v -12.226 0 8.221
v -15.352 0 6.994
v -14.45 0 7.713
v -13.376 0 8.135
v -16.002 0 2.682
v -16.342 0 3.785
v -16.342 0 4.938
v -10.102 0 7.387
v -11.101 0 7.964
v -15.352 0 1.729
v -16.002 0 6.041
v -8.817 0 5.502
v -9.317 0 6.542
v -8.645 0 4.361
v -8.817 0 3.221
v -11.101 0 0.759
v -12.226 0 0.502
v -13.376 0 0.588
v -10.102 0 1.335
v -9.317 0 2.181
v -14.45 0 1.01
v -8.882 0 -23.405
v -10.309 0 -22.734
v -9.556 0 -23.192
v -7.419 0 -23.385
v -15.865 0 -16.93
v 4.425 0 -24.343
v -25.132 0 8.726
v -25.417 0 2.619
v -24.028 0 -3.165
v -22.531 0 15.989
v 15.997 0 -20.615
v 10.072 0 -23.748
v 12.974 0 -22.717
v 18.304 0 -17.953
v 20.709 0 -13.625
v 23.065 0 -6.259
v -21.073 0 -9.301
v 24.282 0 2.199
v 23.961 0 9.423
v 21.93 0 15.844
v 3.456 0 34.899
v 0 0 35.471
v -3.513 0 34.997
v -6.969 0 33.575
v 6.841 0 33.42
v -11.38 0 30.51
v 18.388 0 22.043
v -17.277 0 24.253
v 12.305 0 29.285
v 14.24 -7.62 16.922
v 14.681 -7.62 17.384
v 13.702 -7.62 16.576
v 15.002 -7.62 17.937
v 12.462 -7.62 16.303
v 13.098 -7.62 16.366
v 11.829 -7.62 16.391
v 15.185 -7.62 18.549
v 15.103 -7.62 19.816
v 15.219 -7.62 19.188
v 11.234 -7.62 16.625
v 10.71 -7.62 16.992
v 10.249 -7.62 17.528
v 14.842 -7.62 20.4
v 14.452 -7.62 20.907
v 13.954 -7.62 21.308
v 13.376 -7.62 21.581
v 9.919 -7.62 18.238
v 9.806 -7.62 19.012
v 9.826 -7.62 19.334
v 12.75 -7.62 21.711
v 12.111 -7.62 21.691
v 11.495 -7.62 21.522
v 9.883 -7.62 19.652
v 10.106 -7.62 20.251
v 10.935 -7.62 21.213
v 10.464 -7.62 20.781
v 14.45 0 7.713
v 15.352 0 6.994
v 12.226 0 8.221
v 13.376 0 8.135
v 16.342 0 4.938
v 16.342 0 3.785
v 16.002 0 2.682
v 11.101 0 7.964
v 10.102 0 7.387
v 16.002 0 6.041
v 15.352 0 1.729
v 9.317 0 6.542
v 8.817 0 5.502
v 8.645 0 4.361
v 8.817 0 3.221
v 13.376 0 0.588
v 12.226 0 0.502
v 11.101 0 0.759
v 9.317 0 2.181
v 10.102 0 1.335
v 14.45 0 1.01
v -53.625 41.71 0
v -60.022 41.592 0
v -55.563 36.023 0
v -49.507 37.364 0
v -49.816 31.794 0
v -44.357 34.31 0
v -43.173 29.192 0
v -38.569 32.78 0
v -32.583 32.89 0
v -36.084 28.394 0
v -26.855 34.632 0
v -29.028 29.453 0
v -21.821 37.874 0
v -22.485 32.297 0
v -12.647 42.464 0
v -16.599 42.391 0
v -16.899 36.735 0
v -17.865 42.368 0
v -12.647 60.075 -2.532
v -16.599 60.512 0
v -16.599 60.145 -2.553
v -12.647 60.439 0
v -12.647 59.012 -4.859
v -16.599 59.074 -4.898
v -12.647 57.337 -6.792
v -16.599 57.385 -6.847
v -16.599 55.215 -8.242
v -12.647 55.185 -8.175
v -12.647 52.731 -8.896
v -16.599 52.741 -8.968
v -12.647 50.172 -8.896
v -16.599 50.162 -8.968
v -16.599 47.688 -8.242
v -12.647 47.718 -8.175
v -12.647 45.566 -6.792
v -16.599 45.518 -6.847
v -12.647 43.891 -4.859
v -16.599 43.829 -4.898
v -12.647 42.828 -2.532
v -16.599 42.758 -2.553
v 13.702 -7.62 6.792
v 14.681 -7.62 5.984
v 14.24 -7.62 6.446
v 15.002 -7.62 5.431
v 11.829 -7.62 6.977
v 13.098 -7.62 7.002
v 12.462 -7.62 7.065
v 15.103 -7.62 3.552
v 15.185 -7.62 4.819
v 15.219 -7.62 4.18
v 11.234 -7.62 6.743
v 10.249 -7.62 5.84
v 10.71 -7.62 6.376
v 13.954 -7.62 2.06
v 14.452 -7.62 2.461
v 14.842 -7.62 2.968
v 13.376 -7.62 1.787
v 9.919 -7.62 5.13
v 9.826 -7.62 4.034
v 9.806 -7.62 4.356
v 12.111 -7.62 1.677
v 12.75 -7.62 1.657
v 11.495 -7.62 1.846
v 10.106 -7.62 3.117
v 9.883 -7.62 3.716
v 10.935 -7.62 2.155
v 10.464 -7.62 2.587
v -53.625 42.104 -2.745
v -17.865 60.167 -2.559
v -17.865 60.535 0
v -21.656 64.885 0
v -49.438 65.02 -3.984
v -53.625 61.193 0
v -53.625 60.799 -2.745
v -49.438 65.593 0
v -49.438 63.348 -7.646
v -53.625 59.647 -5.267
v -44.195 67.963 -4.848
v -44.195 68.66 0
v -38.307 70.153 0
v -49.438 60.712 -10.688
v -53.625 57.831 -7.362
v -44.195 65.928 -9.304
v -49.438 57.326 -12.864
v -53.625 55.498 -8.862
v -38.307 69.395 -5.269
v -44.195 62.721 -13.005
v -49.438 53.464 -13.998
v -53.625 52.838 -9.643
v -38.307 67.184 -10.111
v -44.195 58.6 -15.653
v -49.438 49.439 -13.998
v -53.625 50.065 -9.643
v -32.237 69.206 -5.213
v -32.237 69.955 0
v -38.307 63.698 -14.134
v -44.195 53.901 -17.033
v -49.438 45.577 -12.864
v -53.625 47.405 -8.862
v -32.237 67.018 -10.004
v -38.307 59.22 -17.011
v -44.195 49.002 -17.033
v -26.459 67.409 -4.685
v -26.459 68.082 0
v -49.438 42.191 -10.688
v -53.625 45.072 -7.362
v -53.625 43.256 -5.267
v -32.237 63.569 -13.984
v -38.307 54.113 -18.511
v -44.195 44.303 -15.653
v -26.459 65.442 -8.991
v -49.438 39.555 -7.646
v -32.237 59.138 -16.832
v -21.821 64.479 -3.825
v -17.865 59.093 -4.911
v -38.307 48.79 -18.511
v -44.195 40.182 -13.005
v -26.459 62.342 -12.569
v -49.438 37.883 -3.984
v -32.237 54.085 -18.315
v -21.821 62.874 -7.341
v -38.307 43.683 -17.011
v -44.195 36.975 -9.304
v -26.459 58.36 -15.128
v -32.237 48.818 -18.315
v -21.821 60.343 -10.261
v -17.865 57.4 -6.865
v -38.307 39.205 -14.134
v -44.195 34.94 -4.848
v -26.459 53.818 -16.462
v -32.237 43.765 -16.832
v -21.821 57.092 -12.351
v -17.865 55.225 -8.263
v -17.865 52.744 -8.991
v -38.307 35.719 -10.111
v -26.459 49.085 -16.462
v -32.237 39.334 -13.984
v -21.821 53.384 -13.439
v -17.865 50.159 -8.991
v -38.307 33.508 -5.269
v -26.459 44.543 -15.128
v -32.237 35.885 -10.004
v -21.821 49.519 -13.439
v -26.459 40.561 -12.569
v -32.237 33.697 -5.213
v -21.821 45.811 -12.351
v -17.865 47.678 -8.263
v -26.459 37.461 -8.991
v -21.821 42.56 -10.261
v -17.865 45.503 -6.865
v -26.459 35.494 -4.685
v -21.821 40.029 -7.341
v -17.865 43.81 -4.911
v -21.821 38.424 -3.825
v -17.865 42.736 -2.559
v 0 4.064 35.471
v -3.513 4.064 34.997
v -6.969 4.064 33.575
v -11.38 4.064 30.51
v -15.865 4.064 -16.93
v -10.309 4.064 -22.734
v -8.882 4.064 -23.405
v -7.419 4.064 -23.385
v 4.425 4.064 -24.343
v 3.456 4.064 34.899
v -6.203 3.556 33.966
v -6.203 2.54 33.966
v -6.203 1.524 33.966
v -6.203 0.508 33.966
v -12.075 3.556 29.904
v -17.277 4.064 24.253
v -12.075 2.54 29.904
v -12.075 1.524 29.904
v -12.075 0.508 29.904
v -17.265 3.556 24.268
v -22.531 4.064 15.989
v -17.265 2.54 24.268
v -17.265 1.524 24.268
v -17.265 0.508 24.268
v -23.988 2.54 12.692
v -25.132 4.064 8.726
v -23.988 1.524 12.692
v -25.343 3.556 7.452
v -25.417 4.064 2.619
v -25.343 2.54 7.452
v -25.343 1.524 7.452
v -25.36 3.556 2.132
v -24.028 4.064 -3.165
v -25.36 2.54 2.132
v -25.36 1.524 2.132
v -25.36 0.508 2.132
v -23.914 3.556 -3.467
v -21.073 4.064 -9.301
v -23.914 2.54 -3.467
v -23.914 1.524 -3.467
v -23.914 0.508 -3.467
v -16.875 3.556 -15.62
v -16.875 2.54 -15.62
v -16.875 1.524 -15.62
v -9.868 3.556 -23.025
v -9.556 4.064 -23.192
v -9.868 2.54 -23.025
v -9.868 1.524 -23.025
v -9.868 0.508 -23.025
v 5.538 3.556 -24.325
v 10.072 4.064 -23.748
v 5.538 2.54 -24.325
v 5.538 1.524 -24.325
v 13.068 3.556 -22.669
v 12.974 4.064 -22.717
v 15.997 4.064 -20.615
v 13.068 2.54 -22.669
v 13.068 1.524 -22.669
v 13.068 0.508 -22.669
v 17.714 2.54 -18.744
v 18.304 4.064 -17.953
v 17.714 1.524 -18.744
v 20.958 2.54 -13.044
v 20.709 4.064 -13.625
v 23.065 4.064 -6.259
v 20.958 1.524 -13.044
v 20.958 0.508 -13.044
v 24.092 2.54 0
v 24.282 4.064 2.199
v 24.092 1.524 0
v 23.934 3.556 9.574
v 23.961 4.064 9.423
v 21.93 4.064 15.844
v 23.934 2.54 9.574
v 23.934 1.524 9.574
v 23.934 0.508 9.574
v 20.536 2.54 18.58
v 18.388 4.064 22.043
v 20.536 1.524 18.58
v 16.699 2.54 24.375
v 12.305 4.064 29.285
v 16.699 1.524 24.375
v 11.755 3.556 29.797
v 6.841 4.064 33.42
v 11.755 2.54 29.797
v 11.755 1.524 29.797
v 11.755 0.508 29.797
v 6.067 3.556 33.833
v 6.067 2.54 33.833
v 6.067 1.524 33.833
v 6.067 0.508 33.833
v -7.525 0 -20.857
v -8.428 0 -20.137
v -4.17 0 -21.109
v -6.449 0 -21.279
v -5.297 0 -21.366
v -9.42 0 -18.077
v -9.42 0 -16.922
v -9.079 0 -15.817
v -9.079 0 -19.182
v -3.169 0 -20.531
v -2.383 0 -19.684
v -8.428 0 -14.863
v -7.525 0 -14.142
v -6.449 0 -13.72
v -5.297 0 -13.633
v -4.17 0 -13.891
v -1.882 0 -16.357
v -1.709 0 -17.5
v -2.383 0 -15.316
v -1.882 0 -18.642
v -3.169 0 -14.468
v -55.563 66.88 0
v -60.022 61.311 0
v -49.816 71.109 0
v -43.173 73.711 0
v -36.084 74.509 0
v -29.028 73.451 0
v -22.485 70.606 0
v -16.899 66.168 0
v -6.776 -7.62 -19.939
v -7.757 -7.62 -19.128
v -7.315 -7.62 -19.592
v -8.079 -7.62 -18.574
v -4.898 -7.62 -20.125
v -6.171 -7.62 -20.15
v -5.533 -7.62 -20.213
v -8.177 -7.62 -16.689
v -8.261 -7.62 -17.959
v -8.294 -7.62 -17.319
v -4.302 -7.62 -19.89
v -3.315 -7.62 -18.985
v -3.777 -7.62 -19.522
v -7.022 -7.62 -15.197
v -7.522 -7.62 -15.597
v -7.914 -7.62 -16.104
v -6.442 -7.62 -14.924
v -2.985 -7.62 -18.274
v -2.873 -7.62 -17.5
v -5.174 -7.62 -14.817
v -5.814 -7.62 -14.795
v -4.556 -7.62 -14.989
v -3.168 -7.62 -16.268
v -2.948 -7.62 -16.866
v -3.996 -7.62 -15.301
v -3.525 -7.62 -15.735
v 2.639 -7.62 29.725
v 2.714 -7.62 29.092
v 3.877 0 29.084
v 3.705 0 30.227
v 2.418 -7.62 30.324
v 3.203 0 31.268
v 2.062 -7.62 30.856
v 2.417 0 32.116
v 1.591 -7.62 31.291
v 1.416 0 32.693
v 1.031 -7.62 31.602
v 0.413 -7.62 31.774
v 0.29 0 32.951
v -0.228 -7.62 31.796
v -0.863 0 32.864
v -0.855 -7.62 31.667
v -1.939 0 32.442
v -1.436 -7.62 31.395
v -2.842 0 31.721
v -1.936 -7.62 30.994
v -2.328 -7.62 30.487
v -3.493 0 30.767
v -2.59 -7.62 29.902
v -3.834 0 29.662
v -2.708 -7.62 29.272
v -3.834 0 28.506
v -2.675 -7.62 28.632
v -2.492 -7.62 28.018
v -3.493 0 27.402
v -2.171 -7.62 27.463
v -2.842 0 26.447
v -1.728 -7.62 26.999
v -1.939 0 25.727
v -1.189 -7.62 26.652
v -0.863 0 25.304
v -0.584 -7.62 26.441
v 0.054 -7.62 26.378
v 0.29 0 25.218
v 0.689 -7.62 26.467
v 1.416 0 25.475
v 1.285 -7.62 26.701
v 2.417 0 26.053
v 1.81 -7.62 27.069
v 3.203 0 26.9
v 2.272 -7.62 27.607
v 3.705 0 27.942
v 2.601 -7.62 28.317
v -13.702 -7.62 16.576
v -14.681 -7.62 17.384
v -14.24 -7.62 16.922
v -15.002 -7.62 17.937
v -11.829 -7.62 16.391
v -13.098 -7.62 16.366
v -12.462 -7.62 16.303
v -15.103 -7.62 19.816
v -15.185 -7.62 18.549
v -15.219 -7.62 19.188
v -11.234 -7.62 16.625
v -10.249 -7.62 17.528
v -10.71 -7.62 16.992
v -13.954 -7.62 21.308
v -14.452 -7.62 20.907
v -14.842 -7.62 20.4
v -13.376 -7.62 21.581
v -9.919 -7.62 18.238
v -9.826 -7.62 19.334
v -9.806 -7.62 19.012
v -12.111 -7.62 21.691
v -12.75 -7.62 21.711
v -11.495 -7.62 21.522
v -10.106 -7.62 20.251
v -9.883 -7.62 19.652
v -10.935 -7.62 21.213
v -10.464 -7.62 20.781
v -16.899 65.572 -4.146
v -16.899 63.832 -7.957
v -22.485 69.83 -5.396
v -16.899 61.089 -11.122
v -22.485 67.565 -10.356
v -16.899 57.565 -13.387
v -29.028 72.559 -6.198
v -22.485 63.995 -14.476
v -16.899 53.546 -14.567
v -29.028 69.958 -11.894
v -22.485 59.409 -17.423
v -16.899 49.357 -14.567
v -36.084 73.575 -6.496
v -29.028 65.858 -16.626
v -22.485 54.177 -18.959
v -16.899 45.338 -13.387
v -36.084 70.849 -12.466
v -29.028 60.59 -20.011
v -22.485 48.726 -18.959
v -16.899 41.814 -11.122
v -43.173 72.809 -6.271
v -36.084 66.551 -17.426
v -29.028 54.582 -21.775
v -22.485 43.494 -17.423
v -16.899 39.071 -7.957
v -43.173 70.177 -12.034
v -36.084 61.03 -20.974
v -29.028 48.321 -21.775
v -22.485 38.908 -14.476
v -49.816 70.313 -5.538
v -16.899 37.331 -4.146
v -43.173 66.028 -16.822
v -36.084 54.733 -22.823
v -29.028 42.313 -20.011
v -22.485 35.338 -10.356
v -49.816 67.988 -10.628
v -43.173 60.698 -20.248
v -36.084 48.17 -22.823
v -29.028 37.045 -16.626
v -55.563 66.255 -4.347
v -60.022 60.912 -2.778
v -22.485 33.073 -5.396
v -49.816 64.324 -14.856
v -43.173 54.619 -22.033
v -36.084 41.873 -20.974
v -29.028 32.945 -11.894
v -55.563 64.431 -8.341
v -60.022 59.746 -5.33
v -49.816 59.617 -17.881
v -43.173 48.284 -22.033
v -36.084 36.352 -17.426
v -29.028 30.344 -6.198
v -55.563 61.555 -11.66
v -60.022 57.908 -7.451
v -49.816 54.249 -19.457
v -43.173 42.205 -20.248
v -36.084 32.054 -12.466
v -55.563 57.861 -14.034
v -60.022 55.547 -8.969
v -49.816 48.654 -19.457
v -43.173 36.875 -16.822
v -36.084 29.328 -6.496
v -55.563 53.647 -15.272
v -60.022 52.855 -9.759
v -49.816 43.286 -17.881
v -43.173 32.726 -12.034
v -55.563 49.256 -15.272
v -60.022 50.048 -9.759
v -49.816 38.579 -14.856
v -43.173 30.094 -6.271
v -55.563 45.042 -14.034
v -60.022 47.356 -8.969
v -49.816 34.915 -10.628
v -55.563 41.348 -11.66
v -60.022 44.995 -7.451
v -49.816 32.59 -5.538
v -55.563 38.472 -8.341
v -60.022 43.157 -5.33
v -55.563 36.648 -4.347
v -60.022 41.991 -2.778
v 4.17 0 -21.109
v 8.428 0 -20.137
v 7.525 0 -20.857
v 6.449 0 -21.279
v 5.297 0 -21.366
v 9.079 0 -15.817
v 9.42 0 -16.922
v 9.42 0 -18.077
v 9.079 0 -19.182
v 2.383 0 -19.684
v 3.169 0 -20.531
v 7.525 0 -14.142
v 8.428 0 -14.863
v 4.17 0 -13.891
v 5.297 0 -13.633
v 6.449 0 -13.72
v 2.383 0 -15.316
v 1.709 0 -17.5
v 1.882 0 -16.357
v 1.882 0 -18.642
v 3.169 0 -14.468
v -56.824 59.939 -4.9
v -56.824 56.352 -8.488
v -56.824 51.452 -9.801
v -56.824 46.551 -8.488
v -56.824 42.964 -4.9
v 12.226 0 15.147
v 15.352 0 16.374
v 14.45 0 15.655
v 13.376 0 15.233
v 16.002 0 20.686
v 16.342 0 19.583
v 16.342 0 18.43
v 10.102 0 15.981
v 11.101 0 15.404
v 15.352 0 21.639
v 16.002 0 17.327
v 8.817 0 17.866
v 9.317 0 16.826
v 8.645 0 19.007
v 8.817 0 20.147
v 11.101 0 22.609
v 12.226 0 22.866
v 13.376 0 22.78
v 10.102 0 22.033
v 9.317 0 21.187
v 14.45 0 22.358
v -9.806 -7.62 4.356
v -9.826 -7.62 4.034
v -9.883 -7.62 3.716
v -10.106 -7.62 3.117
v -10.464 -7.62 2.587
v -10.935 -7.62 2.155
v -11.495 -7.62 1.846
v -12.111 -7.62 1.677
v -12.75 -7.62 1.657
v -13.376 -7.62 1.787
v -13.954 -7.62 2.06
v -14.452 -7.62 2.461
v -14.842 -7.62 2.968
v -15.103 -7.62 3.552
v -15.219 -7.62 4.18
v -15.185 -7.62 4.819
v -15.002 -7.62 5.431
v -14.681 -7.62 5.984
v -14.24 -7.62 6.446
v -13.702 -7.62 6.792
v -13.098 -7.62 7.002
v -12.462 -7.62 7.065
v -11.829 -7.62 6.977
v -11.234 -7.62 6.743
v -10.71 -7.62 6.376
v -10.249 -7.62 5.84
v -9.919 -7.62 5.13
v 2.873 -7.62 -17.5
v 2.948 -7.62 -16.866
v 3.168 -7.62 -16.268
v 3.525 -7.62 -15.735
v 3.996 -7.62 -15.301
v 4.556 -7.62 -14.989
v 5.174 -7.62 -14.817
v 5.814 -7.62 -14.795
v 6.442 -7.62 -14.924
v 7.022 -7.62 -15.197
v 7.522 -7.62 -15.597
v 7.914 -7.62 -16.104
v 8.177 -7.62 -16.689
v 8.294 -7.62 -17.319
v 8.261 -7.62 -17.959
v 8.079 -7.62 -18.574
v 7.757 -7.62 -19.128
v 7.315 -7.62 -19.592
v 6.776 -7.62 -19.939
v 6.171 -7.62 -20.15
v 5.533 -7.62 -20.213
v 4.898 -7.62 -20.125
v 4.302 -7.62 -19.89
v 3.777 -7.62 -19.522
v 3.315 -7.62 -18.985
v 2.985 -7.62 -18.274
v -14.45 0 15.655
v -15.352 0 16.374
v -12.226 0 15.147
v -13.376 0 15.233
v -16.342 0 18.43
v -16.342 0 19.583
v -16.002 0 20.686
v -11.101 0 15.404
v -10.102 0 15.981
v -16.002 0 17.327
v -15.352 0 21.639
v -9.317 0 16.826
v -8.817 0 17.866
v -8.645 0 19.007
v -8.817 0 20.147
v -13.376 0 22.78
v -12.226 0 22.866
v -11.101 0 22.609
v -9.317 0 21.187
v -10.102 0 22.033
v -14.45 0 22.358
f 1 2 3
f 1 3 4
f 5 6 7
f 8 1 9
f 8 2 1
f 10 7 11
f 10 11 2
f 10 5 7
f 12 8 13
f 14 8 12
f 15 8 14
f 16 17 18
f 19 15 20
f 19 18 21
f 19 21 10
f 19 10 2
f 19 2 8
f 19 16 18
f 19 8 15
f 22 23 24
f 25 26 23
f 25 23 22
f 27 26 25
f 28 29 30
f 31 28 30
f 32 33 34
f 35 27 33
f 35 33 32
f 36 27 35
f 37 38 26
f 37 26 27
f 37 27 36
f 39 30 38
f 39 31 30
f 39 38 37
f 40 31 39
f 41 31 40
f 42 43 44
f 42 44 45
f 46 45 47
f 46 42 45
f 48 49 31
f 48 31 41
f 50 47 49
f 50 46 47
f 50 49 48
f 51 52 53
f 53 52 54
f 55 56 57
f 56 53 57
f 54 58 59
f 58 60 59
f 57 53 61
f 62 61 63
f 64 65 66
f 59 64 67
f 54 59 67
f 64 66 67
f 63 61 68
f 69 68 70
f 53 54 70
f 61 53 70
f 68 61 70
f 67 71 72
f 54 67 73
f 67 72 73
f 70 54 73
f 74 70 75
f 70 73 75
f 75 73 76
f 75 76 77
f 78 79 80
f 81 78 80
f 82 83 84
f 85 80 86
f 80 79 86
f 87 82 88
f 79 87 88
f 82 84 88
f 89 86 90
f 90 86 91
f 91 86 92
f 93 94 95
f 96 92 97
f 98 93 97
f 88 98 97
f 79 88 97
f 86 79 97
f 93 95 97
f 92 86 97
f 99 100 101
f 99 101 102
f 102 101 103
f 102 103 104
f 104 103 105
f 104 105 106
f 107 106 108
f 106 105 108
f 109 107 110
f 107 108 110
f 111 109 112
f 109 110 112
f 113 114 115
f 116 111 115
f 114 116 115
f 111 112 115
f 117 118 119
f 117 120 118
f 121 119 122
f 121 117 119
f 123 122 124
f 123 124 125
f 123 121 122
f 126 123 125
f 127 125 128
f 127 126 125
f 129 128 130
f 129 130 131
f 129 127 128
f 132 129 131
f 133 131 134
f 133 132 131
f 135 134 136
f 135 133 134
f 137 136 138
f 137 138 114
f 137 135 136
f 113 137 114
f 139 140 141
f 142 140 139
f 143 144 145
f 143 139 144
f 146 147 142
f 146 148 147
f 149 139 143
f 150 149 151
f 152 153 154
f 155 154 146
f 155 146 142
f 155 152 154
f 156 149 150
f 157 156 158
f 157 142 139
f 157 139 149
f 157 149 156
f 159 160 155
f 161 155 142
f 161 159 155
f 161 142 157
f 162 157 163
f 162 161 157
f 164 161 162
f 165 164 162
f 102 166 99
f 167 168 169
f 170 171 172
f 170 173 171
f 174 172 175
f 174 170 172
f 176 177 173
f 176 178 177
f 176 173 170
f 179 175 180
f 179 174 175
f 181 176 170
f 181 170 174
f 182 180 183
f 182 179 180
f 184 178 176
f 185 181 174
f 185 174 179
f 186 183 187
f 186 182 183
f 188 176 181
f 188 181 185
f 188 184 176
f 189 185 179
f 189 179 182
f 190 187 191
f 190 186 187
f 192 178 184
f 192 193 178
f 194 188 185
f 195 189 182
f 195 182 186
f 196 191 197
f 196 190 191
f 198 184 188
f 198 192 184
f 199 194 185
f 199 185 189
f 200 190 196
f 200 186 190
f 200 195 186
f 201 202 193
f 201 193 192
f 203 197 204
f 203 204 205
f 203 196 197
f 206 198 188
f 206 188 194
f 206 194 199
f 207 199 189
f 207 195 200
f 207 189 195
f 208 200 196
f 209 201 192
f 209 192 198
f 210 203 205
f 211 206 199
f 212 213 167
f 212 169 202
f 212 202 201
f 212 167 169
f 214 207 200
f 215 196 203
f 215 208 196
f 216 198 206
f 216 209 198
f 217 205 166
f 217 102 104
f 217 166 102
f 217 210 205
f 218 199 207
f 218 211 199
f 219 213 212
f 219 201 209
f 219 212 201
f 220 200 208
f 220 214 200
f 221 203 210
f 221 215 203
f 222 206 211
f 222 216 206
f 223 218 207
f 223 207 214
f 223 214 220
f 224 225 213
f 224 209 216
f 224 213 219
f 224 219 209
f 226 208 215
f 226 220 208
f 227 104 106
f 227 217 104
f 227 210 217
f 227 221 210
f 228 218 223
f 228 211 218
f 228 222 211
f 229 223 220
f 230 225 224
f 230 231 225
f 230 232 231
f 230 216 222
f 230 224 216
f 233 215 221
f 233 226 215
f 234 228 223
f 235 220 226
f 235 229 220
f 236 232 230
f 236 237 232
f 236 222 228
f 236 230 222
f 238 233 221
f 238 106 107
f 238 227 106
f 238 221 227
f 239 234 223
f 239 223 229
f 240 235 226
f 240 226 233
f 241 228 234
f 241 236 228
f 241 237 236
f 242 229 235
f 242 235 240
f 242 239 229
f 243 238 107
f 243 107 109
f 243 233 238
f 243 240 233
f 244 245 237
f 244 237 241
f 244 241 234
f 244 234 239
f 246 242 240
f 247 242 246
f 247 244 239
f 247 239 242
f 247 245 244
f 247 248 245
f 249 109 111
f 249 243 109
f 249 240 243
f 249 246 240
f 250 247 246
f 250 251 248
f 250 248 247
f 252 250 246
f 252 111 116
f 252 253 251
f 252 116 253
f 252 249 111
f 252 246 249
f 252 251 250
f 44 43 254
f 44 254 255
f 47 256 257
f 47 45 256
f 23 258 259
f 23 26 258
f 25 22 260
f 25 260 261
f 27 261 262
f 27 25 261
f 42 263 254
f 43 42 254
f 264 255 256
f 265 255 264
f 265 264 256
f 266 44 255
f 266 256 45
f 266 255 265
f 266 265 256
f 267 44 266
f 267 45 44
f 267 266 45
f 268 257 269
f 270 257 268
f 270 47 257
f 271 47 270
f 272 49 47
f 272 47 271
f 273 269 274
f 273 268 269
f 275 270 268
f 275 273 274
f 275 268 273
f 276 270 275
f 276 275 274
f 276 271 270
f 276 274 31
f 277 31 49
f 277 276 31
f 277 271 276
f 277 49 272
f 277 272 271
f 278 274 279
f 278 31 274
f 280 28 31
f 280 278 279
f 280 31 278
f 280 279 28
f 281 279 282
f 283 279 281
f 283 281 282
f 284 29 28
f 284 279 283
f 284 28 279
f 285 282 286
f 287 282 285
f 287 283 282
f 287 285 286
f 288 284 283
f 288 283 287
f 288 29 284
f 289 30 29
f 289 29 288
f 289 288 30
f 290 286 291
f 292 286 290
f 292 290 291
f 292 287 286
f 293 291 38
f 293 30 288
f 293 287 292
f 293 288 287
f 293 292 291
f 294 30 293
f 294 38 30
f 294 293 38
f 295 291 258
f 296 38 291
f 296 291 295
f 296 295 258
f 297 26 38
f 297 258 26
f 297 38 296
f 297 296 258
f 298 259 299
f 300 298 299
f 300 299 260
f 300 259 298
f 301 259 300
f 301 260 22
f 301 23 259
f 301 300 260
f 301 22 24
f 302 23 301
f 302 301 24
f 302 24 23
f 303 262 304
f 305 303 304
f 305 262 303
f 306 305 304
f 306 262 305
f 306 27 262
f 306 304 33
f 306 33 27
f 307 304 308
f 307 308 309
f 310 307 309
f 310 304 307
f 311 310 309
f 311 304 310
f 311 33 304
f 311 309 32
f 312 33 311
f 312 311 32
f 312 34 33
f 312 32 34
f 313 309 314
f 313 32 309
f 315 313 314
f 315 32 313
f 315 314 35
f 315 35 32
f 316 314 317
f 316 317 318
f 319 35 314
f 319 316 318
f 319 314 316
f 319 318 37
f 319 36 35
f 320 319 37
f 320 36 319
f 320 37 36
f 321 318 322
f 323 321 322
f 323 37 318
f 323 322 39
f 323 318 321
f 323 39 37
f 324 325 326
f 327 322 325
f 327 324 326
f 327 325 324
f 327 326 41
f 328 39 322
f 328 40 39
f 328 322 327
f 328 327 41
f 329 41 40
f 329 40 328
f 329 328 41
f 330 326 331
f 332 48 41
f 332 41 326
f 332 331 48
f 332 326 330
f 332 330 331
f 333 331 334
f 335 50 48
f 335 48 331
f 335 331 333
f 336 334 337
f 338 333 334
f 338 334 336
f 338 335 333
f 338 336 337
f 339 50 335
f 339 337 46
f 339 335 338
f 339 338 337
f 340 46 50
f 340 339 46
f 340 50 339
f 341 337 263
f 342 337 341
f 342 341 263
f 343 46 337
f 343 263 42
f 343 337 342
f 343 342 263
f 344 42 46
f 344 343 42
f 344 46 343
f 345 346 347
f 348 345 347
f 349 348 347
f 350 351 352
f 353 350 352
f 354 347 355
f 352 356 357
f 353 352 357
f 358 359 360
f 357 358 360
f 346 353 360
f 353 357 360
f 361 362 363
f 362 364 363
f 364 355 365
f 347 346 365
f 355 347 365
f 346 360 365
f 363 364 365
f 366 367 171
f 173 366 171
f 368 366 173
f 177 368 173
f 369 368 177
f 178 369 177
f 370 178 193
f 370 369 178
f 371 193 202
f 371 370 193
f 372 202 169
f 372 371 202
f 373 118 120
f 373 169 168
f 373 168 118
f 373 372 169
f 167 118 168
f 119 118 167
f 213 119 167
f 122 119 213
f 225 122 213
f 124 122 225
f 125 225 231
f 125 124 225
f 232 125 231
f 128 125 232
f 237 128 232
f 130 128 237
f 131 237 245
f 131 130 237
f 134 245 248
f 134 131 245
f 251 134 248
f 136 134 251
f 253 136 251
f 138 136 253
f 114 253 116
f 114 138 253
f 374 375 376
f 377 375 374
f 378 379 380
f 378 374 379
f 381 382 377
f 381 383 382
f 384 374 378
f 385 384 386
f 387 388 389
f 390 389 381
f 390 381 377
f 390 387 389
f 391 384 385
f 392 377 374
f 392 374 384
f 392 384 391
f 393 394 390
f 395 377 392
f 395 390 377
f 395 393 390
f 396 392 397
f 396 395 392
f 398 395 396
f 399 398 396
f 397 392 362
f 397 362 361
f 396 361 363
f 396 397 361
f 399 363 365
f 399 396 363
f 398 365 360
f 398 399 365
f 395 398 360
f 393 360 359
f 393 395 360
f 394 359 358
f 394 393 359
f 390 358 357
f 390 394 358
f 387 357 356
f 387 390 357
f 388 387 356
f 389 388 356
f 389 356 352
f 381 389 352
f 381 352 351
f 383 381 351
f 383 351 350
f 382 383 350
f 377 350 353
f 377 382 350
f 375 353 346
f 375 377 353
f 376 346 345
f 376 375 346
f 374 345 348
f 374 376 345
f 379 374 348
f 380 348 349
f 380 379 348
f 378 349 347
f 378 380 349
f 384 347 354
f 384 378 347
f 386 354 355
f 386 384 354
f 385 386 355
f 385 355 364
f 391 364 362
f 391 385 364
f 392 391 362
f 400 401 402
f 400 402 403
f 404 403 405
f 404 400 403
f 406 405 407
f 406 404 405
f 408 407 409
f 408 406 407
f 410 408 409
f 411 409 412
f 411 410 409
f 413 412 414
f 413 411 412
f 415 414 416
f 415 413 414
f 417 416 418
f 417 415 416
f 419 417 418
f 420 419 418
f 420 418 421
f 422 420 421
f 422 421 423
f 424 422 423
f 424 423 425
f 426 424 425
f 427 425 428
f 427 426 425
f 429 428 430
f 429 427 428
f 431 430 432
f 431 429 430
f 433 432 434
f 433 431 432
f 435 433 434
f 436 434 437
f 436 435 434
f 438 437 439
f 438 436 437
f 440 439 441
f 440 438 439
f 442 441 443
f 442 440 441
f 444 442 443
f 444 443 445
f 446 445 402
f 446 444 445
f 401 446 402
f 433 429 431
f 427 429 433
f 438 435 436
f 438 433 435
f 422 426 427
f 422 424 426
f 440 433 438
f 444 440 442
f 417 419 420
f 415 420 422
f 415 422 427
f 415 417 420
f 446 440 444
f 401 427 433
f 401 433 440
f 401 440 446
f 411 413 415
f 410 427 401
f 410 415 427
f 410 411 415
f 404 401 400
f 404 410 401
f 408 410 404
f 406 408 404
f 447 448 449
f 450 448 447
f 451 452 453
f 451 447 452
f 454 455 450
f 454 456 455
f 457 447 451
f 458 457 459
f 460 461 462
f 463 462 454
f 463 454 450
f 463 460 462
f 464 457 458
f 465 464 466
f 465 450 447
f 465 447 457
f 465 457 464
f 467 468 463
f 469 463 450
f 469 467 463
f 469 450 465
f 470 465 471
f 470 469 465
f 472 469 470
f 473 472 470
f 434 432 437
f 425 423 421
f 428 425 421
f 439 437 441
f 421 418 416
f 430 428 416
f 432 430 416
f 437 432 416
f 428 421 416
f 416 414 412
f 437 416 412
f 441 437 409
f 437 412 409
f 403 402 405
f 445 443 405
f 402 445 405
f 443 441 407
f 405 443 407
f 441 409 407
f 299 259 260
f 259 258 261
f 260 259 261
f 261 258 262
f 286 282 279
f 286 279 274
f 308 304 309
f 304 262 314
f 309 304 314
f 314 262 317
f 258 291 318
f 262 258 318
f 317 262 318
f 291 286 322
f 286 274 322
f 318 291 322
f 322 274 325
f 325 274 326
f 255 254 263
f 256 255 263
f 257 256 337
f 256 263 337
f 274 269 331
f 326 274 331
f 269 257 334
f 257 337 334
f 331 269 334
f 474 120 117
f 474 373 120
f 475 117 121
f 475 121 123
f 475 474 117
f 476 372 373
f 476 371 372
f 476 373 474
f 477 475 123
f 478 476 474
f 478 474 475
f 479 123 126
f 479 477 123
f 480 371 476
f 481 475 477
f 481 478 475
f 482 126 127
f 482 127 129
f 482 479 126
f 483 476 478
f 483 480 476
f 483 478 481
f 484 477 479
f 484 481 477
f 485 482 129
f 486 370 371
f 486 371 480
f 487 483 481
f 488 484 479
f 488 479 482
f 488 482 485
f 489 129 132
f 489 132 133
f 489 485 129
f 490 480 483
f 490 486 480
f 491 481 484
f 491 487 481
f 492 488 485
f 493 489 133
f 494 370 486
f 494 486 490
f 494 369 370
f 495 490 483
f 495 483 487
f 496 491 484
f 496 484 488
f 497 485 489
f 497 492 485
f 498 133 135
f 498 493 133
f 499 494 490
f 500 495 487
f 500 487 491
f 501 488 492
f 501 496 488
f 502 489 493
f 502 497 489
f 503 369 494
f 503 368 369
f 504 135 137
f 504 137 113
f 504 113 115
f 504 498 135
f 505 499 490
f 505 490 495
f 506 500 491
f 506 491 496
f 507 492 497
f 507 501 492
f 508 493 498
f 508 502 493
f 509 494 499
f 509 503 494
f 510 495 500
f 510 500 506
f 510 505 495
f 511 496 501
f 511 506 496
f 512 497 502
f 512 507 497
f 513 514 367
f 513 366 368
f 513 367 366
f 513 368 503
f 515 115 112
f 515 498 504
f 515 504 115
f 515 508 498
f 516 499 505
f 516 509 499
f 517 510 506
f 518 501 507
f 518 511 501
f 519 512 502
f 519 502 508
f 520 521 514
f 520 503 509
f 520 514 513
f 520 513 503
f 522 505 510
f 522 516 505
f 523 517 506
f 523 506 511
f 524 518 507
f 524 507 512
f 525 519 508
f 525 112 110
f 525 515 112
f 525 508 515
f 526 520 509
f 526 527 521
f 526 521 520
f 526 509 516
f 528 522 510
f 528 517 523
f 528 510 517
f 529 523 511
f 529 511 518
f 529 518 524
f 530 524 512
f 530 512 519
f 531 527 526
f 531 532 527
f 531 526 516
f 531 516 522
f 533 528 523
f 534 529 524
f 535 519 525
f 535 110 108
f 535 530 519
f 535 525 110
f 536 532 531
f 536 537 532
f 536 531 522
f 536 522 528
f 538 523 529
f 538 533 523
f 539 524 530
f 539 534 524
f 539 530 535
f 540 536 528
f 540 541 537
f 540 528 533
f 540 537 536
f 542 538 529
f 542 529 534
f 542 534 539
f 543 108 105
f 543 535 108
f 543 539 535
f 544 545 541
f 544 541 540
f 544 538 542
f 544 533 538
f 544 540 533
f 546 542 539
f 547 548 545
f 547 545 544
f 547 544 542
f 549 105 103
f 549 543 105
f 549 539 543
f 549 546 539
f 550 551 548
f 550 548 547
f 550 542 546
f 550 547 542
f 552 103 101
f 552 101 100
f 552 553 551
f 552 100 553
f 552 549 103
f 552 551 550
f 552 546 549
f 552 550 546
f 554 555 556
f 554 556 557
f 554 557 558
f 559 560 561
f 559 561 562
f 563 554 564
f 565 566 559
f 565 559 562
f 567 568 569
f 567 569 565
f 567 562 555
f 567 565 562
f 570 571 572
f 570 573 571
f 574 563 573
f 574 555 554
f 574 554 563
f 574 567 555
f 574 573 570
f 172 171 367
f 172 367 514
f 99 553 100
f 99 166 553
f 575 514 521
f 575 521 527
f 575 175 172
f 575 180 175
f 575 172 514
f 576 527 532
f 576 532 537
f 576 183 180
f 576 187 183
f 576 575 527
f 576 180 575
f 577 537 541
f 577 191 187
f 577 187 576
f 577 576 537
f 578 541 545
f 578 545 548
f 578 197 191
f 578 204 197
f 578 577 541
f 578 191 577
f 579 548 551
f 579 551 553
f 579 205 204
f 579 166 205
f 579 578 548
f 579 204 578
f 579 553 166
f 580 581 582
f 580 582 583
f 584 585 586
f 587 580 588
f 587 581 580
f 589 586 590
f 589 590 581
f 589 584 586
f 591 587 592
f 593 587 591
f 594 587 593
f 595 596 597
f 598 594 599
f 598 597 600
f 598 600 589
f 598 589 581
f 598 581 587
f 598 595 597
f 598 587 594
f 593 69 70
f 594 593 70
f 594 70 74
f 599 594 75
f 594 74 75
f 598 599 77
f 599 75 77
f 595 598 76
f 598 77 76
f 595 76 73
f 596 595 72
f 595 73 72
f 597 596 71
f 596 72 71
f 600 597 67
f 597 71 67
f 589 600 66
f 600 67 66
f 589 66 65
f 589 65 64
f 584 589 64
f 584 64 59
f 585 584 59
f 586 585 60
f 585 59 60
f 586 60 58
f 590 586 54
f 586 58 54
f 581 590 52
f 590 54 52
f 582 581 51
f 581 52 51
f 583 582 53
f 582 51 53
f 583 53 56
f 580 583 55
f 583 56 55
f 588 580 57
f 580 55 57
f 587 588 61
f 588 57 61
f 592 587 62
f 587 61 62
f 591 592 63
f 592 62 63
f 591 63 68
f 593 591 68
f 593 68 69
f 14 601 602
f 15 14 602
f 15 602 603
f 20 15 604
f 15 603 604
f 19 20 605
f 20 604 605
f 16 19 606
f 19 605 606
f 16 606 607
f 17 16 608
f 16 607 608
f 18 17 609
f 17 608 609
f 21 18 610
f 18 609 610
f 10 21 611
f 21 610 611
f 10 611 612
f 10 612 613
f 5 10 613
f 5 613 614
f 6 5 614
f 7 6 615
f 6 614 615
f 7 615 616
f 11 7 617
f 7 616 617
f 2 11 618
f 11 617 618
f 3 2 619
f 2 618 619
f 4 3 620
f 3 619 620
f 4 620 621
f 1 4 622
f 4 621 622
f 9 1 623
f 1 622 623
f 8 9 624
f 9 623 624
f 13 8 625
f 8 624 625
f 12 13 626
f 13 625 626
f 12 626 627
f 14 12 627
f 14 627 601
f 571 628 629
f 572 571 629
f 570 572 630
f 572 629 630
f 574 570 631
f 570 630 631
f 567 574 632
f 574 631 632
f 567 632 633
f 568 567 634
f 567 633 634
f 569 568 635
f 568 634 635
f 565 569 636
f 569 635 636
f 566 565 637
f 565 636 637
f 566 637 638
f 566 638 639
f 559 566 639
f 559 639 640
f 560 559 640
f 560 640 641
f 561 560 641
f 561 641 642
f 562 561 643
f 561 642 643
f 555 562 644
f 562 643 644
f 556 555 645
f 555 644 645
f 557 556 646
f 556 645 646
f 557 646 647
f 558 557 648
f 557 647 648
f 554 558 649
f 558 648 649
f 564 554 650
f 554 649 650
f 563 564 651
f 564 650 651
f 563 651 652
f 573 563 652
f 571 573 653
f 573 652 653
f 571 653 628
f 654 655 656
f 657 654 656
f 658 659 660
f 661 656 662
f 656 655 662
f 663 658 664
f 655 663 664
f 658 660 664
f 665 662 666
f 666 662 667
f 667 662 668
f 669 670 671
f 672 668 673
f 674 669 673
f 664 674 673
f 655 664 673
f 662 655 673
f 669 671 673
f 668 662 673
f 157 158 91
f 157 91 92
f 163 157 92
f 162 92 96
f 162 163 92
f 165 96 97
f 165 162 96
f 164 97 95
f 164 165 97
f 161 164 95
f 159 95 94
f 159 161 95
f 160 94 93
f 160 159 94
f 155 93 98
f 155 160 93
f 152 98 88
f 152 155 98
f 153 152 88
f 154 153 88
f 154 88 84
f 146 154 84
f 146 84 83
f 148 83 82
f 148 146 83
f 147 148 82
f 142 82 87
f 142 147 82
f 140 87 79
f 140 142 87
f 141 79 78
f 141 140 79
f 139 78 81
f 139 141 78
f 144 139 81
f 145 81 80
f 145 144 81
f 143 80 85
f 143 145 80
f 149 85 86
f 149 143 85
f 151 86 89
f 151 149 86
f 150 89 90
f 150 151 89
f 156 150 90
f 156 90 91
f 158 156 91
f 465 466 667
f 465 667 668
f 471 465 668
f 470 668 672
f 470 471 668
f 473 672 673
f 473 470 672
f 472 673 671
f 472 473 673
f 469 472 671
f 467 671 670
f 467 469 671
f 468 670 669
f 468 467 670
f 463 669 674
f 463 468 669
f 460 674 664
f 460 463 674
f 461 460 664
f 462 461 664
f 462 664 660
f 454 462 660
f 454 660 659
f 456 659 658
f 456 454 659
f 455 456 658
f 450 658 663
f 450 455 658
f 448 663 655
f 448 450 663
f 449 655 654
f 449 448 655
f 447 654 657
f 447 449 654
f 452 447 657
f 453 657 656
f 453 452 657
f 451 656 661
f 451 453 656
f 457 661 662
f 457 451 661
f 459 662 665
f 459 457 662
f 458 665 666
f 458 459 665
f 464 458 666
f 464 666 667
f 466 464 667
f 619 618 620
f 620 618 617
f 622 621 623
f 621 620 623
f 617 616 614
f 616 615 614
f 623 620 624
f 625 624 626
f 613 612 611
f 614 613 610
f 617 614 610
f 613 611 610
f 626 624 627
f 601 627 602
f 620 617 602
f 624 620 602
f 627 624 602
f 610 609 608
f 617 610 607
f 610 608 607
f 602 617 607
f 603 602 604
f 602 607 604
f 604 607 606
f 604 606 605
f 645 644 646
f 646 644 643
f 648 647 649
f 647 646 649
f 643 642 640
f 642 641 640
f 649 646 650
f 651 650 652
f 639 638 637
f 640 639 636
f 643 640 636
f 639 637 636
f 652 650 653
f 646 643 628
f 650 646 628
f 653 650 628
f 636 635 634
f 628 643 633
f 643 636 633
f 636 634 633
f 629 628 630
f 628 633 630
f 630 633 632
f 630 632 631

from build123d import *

# Parameters (mm, degrees)
F0_R      = 3.8771015689
F5_R      = 5.6983248569
F6_R      = 3.6635547169
F8_R      = 3.8703638435
F11_R     = 7.2019842089
F12_R     = 56.8187209303
F17_R     = 3.8769676926
F20_R     = 53.0821487258
F21_R     = 4.5415408067
F25_DEPTH = 4.064
F28_ANGLE = 180


with BuildPart() as f3:
    # F0 (on Front) → F3 section 0
    with BuildSketch(Plane.XZ, mode=Mode.PRIVATE) as f3_s0:
        with Locations((0, 29.0843397379)):
            Circle(F0_R)
    loft([f3_s0.sketch, Vertex(0, -25.4, 29.1091017425)])

    # F5 (on offset) → F7 section 0
    with BuildSketch(Plane.XZ.offset(7.62)):
        with Locations((0, 28.4678451717)):
            Circle(F5_R)
    # F6 (on offset) → F7 section 1
    with BuildSketch(Plane.XZ.offset(25.4)):
        with Locations((0, 29.0928874165)):
            Circle(F6_R)
    loft(mode=Mode.SUBTRACT)


with BuildPart() as f10:
    # F8 (on Front) → F10 section 0
    with BuildSketch(Plane.XZ, mode=Mode.PRIVATE) as f10_s0:
        with Locations((-12.5149413943, 19.0065298229)):
            Circle(F8_R)
    loft([f10_s0.sketch, Vertex(-12.517310679, -25.4, 19.0245490521)])

    # F11 (on offset) → F13 section 0
    with BuildSketch(Plane.XZ.offset(7.62)):
        with Locations((-9.7385119116, 19.0026373996)):
            Circle(F11_R)
    # F12 (on offset) → F13 section 1
    with BuildSketch(Plane.XZ.offset(25.4)):
        with Locations((-23.6887745559, 25.0486060977)):
            Circle(F12_R)
    loft(mode=Mode.SUBTRACT)


with BuildPart() as f14_1:
    # F14: instance of F10
    add(f10.part.mirror(Plane.YZ))


with BuildPart() as f16_1:
    # F16: instance of F10
    add(f10.part.mirror(Plane.XY.offset(11.684)))


with BuildPart() as f16_2:
    # F16: instance of F14_1
    add(f14_1.part.mirror(Plane.XY.offset(11.684)))


with BuildPart() as f19:
    # F17 (on Front) → F19 section 0
    with BuildSketch(Plane.XZ, mode=Mode.PRIVATE) as f19_s0:
        with Locations((-5.5864057504, -17.4995753914)):
            Circle(F17_R)
    loft([f19_s0.sketch, Vertex(-5.5864183232, -25.4, -17.4995232373)])

    # F20 (on offset) → F22 section 0
    with BuildSketch(Plane.XZ.offset(7.62)):
        with Locations((-10.2948704734, -11.3515909761)):
            Circle(F20_R)
    # F21 (on offset) → F22 section 1
    with BuildSketch(Plane.XZ.offset(25.4)):
        with Locations((-5.5690594018, -17.5002664328)):
            Circle(F21_R)
    loft(mode=Mode.SUBTRACT)


with BuildPart() as f23_1:
    # F23: instance of F19
    add(f19.part.mirror(Plane.YZ))


with BuildPart() as f25:
    # F24 (on Front) → F25 (new body)
    with BuildSketch(Plane.XZ):
        with BuildLine():
            add(Edge.make_bspline(
                [(0, 35.4711003602), (-8.3377268177, 35.6079903839), (-24.1422378847, 18.0486125422), (-28.2291177434, -2.5517682042), (-10.1608107669, -24.5971800029), (-7.016069321, -22.5096620341), (17.695737715, -28.6550145381), (25.7384476983, 1.1807424816), (23.1853158982, 18.3165576298), (8.1814002308, 35.3367769293), (0, 35.4711003602)],
                knots=[0, 0, 0, 0, 0.1478180646, 0.2787213559, 0.4167501874, 0.4658218658, 0.5913848015, 0.7326107204, 0.8549534214, 1, 1, 1, 1], degree=3))
        make_face()
    extrude(amount=-F25_DEPTH)


with BuildPart() as f28:
    # F27 (on Top) → F28 (revolve)
    with BuildSketch(Plane.XY):
        with BuildLine():
            ThreePointArc((-12.6473630132, 60.4391704599), (-36.0837241785, 74.5094241889), (-60.0219592452, 61.3110922277))
            Line((-60.0219592452, 61.3110922277), (-16.5989212692, 60.5118982494))
            Line((-16.5989212692, 60.5118982494), (-12.6473630132, 60.4391704599))
        make_face()
    revolve(axis=Axis((-38.0492019467, 51.4515116811, 0), (-1, 0, 0)), revolution_arc=F28_ANGLE)

    # F29 (on face) → F30 (revolve, cut)
    with BuildSketch(Plane.XY):
        with BuildLine():
            Line((-17.8651539403, 42.3678203056), (-53.6254472387, 41.7096579015))
            ThreePointArc((-53.6254472387, 41.7096579015), (-35.5720890855, 32.6275449227), (-17.8651539403, 42.3678203056))
        make_face()
    revolve(axis=Axis((-38.0492019467, 51.4515116811, 0), (-1, 0, 0)), mode=Mode.SUBTRACT)


solid = Compound([f3.part, f10.part, f14_1.part, f16_1.part, f16_2.part, f19.part, f23_1.part, f25.part, f28.part])
